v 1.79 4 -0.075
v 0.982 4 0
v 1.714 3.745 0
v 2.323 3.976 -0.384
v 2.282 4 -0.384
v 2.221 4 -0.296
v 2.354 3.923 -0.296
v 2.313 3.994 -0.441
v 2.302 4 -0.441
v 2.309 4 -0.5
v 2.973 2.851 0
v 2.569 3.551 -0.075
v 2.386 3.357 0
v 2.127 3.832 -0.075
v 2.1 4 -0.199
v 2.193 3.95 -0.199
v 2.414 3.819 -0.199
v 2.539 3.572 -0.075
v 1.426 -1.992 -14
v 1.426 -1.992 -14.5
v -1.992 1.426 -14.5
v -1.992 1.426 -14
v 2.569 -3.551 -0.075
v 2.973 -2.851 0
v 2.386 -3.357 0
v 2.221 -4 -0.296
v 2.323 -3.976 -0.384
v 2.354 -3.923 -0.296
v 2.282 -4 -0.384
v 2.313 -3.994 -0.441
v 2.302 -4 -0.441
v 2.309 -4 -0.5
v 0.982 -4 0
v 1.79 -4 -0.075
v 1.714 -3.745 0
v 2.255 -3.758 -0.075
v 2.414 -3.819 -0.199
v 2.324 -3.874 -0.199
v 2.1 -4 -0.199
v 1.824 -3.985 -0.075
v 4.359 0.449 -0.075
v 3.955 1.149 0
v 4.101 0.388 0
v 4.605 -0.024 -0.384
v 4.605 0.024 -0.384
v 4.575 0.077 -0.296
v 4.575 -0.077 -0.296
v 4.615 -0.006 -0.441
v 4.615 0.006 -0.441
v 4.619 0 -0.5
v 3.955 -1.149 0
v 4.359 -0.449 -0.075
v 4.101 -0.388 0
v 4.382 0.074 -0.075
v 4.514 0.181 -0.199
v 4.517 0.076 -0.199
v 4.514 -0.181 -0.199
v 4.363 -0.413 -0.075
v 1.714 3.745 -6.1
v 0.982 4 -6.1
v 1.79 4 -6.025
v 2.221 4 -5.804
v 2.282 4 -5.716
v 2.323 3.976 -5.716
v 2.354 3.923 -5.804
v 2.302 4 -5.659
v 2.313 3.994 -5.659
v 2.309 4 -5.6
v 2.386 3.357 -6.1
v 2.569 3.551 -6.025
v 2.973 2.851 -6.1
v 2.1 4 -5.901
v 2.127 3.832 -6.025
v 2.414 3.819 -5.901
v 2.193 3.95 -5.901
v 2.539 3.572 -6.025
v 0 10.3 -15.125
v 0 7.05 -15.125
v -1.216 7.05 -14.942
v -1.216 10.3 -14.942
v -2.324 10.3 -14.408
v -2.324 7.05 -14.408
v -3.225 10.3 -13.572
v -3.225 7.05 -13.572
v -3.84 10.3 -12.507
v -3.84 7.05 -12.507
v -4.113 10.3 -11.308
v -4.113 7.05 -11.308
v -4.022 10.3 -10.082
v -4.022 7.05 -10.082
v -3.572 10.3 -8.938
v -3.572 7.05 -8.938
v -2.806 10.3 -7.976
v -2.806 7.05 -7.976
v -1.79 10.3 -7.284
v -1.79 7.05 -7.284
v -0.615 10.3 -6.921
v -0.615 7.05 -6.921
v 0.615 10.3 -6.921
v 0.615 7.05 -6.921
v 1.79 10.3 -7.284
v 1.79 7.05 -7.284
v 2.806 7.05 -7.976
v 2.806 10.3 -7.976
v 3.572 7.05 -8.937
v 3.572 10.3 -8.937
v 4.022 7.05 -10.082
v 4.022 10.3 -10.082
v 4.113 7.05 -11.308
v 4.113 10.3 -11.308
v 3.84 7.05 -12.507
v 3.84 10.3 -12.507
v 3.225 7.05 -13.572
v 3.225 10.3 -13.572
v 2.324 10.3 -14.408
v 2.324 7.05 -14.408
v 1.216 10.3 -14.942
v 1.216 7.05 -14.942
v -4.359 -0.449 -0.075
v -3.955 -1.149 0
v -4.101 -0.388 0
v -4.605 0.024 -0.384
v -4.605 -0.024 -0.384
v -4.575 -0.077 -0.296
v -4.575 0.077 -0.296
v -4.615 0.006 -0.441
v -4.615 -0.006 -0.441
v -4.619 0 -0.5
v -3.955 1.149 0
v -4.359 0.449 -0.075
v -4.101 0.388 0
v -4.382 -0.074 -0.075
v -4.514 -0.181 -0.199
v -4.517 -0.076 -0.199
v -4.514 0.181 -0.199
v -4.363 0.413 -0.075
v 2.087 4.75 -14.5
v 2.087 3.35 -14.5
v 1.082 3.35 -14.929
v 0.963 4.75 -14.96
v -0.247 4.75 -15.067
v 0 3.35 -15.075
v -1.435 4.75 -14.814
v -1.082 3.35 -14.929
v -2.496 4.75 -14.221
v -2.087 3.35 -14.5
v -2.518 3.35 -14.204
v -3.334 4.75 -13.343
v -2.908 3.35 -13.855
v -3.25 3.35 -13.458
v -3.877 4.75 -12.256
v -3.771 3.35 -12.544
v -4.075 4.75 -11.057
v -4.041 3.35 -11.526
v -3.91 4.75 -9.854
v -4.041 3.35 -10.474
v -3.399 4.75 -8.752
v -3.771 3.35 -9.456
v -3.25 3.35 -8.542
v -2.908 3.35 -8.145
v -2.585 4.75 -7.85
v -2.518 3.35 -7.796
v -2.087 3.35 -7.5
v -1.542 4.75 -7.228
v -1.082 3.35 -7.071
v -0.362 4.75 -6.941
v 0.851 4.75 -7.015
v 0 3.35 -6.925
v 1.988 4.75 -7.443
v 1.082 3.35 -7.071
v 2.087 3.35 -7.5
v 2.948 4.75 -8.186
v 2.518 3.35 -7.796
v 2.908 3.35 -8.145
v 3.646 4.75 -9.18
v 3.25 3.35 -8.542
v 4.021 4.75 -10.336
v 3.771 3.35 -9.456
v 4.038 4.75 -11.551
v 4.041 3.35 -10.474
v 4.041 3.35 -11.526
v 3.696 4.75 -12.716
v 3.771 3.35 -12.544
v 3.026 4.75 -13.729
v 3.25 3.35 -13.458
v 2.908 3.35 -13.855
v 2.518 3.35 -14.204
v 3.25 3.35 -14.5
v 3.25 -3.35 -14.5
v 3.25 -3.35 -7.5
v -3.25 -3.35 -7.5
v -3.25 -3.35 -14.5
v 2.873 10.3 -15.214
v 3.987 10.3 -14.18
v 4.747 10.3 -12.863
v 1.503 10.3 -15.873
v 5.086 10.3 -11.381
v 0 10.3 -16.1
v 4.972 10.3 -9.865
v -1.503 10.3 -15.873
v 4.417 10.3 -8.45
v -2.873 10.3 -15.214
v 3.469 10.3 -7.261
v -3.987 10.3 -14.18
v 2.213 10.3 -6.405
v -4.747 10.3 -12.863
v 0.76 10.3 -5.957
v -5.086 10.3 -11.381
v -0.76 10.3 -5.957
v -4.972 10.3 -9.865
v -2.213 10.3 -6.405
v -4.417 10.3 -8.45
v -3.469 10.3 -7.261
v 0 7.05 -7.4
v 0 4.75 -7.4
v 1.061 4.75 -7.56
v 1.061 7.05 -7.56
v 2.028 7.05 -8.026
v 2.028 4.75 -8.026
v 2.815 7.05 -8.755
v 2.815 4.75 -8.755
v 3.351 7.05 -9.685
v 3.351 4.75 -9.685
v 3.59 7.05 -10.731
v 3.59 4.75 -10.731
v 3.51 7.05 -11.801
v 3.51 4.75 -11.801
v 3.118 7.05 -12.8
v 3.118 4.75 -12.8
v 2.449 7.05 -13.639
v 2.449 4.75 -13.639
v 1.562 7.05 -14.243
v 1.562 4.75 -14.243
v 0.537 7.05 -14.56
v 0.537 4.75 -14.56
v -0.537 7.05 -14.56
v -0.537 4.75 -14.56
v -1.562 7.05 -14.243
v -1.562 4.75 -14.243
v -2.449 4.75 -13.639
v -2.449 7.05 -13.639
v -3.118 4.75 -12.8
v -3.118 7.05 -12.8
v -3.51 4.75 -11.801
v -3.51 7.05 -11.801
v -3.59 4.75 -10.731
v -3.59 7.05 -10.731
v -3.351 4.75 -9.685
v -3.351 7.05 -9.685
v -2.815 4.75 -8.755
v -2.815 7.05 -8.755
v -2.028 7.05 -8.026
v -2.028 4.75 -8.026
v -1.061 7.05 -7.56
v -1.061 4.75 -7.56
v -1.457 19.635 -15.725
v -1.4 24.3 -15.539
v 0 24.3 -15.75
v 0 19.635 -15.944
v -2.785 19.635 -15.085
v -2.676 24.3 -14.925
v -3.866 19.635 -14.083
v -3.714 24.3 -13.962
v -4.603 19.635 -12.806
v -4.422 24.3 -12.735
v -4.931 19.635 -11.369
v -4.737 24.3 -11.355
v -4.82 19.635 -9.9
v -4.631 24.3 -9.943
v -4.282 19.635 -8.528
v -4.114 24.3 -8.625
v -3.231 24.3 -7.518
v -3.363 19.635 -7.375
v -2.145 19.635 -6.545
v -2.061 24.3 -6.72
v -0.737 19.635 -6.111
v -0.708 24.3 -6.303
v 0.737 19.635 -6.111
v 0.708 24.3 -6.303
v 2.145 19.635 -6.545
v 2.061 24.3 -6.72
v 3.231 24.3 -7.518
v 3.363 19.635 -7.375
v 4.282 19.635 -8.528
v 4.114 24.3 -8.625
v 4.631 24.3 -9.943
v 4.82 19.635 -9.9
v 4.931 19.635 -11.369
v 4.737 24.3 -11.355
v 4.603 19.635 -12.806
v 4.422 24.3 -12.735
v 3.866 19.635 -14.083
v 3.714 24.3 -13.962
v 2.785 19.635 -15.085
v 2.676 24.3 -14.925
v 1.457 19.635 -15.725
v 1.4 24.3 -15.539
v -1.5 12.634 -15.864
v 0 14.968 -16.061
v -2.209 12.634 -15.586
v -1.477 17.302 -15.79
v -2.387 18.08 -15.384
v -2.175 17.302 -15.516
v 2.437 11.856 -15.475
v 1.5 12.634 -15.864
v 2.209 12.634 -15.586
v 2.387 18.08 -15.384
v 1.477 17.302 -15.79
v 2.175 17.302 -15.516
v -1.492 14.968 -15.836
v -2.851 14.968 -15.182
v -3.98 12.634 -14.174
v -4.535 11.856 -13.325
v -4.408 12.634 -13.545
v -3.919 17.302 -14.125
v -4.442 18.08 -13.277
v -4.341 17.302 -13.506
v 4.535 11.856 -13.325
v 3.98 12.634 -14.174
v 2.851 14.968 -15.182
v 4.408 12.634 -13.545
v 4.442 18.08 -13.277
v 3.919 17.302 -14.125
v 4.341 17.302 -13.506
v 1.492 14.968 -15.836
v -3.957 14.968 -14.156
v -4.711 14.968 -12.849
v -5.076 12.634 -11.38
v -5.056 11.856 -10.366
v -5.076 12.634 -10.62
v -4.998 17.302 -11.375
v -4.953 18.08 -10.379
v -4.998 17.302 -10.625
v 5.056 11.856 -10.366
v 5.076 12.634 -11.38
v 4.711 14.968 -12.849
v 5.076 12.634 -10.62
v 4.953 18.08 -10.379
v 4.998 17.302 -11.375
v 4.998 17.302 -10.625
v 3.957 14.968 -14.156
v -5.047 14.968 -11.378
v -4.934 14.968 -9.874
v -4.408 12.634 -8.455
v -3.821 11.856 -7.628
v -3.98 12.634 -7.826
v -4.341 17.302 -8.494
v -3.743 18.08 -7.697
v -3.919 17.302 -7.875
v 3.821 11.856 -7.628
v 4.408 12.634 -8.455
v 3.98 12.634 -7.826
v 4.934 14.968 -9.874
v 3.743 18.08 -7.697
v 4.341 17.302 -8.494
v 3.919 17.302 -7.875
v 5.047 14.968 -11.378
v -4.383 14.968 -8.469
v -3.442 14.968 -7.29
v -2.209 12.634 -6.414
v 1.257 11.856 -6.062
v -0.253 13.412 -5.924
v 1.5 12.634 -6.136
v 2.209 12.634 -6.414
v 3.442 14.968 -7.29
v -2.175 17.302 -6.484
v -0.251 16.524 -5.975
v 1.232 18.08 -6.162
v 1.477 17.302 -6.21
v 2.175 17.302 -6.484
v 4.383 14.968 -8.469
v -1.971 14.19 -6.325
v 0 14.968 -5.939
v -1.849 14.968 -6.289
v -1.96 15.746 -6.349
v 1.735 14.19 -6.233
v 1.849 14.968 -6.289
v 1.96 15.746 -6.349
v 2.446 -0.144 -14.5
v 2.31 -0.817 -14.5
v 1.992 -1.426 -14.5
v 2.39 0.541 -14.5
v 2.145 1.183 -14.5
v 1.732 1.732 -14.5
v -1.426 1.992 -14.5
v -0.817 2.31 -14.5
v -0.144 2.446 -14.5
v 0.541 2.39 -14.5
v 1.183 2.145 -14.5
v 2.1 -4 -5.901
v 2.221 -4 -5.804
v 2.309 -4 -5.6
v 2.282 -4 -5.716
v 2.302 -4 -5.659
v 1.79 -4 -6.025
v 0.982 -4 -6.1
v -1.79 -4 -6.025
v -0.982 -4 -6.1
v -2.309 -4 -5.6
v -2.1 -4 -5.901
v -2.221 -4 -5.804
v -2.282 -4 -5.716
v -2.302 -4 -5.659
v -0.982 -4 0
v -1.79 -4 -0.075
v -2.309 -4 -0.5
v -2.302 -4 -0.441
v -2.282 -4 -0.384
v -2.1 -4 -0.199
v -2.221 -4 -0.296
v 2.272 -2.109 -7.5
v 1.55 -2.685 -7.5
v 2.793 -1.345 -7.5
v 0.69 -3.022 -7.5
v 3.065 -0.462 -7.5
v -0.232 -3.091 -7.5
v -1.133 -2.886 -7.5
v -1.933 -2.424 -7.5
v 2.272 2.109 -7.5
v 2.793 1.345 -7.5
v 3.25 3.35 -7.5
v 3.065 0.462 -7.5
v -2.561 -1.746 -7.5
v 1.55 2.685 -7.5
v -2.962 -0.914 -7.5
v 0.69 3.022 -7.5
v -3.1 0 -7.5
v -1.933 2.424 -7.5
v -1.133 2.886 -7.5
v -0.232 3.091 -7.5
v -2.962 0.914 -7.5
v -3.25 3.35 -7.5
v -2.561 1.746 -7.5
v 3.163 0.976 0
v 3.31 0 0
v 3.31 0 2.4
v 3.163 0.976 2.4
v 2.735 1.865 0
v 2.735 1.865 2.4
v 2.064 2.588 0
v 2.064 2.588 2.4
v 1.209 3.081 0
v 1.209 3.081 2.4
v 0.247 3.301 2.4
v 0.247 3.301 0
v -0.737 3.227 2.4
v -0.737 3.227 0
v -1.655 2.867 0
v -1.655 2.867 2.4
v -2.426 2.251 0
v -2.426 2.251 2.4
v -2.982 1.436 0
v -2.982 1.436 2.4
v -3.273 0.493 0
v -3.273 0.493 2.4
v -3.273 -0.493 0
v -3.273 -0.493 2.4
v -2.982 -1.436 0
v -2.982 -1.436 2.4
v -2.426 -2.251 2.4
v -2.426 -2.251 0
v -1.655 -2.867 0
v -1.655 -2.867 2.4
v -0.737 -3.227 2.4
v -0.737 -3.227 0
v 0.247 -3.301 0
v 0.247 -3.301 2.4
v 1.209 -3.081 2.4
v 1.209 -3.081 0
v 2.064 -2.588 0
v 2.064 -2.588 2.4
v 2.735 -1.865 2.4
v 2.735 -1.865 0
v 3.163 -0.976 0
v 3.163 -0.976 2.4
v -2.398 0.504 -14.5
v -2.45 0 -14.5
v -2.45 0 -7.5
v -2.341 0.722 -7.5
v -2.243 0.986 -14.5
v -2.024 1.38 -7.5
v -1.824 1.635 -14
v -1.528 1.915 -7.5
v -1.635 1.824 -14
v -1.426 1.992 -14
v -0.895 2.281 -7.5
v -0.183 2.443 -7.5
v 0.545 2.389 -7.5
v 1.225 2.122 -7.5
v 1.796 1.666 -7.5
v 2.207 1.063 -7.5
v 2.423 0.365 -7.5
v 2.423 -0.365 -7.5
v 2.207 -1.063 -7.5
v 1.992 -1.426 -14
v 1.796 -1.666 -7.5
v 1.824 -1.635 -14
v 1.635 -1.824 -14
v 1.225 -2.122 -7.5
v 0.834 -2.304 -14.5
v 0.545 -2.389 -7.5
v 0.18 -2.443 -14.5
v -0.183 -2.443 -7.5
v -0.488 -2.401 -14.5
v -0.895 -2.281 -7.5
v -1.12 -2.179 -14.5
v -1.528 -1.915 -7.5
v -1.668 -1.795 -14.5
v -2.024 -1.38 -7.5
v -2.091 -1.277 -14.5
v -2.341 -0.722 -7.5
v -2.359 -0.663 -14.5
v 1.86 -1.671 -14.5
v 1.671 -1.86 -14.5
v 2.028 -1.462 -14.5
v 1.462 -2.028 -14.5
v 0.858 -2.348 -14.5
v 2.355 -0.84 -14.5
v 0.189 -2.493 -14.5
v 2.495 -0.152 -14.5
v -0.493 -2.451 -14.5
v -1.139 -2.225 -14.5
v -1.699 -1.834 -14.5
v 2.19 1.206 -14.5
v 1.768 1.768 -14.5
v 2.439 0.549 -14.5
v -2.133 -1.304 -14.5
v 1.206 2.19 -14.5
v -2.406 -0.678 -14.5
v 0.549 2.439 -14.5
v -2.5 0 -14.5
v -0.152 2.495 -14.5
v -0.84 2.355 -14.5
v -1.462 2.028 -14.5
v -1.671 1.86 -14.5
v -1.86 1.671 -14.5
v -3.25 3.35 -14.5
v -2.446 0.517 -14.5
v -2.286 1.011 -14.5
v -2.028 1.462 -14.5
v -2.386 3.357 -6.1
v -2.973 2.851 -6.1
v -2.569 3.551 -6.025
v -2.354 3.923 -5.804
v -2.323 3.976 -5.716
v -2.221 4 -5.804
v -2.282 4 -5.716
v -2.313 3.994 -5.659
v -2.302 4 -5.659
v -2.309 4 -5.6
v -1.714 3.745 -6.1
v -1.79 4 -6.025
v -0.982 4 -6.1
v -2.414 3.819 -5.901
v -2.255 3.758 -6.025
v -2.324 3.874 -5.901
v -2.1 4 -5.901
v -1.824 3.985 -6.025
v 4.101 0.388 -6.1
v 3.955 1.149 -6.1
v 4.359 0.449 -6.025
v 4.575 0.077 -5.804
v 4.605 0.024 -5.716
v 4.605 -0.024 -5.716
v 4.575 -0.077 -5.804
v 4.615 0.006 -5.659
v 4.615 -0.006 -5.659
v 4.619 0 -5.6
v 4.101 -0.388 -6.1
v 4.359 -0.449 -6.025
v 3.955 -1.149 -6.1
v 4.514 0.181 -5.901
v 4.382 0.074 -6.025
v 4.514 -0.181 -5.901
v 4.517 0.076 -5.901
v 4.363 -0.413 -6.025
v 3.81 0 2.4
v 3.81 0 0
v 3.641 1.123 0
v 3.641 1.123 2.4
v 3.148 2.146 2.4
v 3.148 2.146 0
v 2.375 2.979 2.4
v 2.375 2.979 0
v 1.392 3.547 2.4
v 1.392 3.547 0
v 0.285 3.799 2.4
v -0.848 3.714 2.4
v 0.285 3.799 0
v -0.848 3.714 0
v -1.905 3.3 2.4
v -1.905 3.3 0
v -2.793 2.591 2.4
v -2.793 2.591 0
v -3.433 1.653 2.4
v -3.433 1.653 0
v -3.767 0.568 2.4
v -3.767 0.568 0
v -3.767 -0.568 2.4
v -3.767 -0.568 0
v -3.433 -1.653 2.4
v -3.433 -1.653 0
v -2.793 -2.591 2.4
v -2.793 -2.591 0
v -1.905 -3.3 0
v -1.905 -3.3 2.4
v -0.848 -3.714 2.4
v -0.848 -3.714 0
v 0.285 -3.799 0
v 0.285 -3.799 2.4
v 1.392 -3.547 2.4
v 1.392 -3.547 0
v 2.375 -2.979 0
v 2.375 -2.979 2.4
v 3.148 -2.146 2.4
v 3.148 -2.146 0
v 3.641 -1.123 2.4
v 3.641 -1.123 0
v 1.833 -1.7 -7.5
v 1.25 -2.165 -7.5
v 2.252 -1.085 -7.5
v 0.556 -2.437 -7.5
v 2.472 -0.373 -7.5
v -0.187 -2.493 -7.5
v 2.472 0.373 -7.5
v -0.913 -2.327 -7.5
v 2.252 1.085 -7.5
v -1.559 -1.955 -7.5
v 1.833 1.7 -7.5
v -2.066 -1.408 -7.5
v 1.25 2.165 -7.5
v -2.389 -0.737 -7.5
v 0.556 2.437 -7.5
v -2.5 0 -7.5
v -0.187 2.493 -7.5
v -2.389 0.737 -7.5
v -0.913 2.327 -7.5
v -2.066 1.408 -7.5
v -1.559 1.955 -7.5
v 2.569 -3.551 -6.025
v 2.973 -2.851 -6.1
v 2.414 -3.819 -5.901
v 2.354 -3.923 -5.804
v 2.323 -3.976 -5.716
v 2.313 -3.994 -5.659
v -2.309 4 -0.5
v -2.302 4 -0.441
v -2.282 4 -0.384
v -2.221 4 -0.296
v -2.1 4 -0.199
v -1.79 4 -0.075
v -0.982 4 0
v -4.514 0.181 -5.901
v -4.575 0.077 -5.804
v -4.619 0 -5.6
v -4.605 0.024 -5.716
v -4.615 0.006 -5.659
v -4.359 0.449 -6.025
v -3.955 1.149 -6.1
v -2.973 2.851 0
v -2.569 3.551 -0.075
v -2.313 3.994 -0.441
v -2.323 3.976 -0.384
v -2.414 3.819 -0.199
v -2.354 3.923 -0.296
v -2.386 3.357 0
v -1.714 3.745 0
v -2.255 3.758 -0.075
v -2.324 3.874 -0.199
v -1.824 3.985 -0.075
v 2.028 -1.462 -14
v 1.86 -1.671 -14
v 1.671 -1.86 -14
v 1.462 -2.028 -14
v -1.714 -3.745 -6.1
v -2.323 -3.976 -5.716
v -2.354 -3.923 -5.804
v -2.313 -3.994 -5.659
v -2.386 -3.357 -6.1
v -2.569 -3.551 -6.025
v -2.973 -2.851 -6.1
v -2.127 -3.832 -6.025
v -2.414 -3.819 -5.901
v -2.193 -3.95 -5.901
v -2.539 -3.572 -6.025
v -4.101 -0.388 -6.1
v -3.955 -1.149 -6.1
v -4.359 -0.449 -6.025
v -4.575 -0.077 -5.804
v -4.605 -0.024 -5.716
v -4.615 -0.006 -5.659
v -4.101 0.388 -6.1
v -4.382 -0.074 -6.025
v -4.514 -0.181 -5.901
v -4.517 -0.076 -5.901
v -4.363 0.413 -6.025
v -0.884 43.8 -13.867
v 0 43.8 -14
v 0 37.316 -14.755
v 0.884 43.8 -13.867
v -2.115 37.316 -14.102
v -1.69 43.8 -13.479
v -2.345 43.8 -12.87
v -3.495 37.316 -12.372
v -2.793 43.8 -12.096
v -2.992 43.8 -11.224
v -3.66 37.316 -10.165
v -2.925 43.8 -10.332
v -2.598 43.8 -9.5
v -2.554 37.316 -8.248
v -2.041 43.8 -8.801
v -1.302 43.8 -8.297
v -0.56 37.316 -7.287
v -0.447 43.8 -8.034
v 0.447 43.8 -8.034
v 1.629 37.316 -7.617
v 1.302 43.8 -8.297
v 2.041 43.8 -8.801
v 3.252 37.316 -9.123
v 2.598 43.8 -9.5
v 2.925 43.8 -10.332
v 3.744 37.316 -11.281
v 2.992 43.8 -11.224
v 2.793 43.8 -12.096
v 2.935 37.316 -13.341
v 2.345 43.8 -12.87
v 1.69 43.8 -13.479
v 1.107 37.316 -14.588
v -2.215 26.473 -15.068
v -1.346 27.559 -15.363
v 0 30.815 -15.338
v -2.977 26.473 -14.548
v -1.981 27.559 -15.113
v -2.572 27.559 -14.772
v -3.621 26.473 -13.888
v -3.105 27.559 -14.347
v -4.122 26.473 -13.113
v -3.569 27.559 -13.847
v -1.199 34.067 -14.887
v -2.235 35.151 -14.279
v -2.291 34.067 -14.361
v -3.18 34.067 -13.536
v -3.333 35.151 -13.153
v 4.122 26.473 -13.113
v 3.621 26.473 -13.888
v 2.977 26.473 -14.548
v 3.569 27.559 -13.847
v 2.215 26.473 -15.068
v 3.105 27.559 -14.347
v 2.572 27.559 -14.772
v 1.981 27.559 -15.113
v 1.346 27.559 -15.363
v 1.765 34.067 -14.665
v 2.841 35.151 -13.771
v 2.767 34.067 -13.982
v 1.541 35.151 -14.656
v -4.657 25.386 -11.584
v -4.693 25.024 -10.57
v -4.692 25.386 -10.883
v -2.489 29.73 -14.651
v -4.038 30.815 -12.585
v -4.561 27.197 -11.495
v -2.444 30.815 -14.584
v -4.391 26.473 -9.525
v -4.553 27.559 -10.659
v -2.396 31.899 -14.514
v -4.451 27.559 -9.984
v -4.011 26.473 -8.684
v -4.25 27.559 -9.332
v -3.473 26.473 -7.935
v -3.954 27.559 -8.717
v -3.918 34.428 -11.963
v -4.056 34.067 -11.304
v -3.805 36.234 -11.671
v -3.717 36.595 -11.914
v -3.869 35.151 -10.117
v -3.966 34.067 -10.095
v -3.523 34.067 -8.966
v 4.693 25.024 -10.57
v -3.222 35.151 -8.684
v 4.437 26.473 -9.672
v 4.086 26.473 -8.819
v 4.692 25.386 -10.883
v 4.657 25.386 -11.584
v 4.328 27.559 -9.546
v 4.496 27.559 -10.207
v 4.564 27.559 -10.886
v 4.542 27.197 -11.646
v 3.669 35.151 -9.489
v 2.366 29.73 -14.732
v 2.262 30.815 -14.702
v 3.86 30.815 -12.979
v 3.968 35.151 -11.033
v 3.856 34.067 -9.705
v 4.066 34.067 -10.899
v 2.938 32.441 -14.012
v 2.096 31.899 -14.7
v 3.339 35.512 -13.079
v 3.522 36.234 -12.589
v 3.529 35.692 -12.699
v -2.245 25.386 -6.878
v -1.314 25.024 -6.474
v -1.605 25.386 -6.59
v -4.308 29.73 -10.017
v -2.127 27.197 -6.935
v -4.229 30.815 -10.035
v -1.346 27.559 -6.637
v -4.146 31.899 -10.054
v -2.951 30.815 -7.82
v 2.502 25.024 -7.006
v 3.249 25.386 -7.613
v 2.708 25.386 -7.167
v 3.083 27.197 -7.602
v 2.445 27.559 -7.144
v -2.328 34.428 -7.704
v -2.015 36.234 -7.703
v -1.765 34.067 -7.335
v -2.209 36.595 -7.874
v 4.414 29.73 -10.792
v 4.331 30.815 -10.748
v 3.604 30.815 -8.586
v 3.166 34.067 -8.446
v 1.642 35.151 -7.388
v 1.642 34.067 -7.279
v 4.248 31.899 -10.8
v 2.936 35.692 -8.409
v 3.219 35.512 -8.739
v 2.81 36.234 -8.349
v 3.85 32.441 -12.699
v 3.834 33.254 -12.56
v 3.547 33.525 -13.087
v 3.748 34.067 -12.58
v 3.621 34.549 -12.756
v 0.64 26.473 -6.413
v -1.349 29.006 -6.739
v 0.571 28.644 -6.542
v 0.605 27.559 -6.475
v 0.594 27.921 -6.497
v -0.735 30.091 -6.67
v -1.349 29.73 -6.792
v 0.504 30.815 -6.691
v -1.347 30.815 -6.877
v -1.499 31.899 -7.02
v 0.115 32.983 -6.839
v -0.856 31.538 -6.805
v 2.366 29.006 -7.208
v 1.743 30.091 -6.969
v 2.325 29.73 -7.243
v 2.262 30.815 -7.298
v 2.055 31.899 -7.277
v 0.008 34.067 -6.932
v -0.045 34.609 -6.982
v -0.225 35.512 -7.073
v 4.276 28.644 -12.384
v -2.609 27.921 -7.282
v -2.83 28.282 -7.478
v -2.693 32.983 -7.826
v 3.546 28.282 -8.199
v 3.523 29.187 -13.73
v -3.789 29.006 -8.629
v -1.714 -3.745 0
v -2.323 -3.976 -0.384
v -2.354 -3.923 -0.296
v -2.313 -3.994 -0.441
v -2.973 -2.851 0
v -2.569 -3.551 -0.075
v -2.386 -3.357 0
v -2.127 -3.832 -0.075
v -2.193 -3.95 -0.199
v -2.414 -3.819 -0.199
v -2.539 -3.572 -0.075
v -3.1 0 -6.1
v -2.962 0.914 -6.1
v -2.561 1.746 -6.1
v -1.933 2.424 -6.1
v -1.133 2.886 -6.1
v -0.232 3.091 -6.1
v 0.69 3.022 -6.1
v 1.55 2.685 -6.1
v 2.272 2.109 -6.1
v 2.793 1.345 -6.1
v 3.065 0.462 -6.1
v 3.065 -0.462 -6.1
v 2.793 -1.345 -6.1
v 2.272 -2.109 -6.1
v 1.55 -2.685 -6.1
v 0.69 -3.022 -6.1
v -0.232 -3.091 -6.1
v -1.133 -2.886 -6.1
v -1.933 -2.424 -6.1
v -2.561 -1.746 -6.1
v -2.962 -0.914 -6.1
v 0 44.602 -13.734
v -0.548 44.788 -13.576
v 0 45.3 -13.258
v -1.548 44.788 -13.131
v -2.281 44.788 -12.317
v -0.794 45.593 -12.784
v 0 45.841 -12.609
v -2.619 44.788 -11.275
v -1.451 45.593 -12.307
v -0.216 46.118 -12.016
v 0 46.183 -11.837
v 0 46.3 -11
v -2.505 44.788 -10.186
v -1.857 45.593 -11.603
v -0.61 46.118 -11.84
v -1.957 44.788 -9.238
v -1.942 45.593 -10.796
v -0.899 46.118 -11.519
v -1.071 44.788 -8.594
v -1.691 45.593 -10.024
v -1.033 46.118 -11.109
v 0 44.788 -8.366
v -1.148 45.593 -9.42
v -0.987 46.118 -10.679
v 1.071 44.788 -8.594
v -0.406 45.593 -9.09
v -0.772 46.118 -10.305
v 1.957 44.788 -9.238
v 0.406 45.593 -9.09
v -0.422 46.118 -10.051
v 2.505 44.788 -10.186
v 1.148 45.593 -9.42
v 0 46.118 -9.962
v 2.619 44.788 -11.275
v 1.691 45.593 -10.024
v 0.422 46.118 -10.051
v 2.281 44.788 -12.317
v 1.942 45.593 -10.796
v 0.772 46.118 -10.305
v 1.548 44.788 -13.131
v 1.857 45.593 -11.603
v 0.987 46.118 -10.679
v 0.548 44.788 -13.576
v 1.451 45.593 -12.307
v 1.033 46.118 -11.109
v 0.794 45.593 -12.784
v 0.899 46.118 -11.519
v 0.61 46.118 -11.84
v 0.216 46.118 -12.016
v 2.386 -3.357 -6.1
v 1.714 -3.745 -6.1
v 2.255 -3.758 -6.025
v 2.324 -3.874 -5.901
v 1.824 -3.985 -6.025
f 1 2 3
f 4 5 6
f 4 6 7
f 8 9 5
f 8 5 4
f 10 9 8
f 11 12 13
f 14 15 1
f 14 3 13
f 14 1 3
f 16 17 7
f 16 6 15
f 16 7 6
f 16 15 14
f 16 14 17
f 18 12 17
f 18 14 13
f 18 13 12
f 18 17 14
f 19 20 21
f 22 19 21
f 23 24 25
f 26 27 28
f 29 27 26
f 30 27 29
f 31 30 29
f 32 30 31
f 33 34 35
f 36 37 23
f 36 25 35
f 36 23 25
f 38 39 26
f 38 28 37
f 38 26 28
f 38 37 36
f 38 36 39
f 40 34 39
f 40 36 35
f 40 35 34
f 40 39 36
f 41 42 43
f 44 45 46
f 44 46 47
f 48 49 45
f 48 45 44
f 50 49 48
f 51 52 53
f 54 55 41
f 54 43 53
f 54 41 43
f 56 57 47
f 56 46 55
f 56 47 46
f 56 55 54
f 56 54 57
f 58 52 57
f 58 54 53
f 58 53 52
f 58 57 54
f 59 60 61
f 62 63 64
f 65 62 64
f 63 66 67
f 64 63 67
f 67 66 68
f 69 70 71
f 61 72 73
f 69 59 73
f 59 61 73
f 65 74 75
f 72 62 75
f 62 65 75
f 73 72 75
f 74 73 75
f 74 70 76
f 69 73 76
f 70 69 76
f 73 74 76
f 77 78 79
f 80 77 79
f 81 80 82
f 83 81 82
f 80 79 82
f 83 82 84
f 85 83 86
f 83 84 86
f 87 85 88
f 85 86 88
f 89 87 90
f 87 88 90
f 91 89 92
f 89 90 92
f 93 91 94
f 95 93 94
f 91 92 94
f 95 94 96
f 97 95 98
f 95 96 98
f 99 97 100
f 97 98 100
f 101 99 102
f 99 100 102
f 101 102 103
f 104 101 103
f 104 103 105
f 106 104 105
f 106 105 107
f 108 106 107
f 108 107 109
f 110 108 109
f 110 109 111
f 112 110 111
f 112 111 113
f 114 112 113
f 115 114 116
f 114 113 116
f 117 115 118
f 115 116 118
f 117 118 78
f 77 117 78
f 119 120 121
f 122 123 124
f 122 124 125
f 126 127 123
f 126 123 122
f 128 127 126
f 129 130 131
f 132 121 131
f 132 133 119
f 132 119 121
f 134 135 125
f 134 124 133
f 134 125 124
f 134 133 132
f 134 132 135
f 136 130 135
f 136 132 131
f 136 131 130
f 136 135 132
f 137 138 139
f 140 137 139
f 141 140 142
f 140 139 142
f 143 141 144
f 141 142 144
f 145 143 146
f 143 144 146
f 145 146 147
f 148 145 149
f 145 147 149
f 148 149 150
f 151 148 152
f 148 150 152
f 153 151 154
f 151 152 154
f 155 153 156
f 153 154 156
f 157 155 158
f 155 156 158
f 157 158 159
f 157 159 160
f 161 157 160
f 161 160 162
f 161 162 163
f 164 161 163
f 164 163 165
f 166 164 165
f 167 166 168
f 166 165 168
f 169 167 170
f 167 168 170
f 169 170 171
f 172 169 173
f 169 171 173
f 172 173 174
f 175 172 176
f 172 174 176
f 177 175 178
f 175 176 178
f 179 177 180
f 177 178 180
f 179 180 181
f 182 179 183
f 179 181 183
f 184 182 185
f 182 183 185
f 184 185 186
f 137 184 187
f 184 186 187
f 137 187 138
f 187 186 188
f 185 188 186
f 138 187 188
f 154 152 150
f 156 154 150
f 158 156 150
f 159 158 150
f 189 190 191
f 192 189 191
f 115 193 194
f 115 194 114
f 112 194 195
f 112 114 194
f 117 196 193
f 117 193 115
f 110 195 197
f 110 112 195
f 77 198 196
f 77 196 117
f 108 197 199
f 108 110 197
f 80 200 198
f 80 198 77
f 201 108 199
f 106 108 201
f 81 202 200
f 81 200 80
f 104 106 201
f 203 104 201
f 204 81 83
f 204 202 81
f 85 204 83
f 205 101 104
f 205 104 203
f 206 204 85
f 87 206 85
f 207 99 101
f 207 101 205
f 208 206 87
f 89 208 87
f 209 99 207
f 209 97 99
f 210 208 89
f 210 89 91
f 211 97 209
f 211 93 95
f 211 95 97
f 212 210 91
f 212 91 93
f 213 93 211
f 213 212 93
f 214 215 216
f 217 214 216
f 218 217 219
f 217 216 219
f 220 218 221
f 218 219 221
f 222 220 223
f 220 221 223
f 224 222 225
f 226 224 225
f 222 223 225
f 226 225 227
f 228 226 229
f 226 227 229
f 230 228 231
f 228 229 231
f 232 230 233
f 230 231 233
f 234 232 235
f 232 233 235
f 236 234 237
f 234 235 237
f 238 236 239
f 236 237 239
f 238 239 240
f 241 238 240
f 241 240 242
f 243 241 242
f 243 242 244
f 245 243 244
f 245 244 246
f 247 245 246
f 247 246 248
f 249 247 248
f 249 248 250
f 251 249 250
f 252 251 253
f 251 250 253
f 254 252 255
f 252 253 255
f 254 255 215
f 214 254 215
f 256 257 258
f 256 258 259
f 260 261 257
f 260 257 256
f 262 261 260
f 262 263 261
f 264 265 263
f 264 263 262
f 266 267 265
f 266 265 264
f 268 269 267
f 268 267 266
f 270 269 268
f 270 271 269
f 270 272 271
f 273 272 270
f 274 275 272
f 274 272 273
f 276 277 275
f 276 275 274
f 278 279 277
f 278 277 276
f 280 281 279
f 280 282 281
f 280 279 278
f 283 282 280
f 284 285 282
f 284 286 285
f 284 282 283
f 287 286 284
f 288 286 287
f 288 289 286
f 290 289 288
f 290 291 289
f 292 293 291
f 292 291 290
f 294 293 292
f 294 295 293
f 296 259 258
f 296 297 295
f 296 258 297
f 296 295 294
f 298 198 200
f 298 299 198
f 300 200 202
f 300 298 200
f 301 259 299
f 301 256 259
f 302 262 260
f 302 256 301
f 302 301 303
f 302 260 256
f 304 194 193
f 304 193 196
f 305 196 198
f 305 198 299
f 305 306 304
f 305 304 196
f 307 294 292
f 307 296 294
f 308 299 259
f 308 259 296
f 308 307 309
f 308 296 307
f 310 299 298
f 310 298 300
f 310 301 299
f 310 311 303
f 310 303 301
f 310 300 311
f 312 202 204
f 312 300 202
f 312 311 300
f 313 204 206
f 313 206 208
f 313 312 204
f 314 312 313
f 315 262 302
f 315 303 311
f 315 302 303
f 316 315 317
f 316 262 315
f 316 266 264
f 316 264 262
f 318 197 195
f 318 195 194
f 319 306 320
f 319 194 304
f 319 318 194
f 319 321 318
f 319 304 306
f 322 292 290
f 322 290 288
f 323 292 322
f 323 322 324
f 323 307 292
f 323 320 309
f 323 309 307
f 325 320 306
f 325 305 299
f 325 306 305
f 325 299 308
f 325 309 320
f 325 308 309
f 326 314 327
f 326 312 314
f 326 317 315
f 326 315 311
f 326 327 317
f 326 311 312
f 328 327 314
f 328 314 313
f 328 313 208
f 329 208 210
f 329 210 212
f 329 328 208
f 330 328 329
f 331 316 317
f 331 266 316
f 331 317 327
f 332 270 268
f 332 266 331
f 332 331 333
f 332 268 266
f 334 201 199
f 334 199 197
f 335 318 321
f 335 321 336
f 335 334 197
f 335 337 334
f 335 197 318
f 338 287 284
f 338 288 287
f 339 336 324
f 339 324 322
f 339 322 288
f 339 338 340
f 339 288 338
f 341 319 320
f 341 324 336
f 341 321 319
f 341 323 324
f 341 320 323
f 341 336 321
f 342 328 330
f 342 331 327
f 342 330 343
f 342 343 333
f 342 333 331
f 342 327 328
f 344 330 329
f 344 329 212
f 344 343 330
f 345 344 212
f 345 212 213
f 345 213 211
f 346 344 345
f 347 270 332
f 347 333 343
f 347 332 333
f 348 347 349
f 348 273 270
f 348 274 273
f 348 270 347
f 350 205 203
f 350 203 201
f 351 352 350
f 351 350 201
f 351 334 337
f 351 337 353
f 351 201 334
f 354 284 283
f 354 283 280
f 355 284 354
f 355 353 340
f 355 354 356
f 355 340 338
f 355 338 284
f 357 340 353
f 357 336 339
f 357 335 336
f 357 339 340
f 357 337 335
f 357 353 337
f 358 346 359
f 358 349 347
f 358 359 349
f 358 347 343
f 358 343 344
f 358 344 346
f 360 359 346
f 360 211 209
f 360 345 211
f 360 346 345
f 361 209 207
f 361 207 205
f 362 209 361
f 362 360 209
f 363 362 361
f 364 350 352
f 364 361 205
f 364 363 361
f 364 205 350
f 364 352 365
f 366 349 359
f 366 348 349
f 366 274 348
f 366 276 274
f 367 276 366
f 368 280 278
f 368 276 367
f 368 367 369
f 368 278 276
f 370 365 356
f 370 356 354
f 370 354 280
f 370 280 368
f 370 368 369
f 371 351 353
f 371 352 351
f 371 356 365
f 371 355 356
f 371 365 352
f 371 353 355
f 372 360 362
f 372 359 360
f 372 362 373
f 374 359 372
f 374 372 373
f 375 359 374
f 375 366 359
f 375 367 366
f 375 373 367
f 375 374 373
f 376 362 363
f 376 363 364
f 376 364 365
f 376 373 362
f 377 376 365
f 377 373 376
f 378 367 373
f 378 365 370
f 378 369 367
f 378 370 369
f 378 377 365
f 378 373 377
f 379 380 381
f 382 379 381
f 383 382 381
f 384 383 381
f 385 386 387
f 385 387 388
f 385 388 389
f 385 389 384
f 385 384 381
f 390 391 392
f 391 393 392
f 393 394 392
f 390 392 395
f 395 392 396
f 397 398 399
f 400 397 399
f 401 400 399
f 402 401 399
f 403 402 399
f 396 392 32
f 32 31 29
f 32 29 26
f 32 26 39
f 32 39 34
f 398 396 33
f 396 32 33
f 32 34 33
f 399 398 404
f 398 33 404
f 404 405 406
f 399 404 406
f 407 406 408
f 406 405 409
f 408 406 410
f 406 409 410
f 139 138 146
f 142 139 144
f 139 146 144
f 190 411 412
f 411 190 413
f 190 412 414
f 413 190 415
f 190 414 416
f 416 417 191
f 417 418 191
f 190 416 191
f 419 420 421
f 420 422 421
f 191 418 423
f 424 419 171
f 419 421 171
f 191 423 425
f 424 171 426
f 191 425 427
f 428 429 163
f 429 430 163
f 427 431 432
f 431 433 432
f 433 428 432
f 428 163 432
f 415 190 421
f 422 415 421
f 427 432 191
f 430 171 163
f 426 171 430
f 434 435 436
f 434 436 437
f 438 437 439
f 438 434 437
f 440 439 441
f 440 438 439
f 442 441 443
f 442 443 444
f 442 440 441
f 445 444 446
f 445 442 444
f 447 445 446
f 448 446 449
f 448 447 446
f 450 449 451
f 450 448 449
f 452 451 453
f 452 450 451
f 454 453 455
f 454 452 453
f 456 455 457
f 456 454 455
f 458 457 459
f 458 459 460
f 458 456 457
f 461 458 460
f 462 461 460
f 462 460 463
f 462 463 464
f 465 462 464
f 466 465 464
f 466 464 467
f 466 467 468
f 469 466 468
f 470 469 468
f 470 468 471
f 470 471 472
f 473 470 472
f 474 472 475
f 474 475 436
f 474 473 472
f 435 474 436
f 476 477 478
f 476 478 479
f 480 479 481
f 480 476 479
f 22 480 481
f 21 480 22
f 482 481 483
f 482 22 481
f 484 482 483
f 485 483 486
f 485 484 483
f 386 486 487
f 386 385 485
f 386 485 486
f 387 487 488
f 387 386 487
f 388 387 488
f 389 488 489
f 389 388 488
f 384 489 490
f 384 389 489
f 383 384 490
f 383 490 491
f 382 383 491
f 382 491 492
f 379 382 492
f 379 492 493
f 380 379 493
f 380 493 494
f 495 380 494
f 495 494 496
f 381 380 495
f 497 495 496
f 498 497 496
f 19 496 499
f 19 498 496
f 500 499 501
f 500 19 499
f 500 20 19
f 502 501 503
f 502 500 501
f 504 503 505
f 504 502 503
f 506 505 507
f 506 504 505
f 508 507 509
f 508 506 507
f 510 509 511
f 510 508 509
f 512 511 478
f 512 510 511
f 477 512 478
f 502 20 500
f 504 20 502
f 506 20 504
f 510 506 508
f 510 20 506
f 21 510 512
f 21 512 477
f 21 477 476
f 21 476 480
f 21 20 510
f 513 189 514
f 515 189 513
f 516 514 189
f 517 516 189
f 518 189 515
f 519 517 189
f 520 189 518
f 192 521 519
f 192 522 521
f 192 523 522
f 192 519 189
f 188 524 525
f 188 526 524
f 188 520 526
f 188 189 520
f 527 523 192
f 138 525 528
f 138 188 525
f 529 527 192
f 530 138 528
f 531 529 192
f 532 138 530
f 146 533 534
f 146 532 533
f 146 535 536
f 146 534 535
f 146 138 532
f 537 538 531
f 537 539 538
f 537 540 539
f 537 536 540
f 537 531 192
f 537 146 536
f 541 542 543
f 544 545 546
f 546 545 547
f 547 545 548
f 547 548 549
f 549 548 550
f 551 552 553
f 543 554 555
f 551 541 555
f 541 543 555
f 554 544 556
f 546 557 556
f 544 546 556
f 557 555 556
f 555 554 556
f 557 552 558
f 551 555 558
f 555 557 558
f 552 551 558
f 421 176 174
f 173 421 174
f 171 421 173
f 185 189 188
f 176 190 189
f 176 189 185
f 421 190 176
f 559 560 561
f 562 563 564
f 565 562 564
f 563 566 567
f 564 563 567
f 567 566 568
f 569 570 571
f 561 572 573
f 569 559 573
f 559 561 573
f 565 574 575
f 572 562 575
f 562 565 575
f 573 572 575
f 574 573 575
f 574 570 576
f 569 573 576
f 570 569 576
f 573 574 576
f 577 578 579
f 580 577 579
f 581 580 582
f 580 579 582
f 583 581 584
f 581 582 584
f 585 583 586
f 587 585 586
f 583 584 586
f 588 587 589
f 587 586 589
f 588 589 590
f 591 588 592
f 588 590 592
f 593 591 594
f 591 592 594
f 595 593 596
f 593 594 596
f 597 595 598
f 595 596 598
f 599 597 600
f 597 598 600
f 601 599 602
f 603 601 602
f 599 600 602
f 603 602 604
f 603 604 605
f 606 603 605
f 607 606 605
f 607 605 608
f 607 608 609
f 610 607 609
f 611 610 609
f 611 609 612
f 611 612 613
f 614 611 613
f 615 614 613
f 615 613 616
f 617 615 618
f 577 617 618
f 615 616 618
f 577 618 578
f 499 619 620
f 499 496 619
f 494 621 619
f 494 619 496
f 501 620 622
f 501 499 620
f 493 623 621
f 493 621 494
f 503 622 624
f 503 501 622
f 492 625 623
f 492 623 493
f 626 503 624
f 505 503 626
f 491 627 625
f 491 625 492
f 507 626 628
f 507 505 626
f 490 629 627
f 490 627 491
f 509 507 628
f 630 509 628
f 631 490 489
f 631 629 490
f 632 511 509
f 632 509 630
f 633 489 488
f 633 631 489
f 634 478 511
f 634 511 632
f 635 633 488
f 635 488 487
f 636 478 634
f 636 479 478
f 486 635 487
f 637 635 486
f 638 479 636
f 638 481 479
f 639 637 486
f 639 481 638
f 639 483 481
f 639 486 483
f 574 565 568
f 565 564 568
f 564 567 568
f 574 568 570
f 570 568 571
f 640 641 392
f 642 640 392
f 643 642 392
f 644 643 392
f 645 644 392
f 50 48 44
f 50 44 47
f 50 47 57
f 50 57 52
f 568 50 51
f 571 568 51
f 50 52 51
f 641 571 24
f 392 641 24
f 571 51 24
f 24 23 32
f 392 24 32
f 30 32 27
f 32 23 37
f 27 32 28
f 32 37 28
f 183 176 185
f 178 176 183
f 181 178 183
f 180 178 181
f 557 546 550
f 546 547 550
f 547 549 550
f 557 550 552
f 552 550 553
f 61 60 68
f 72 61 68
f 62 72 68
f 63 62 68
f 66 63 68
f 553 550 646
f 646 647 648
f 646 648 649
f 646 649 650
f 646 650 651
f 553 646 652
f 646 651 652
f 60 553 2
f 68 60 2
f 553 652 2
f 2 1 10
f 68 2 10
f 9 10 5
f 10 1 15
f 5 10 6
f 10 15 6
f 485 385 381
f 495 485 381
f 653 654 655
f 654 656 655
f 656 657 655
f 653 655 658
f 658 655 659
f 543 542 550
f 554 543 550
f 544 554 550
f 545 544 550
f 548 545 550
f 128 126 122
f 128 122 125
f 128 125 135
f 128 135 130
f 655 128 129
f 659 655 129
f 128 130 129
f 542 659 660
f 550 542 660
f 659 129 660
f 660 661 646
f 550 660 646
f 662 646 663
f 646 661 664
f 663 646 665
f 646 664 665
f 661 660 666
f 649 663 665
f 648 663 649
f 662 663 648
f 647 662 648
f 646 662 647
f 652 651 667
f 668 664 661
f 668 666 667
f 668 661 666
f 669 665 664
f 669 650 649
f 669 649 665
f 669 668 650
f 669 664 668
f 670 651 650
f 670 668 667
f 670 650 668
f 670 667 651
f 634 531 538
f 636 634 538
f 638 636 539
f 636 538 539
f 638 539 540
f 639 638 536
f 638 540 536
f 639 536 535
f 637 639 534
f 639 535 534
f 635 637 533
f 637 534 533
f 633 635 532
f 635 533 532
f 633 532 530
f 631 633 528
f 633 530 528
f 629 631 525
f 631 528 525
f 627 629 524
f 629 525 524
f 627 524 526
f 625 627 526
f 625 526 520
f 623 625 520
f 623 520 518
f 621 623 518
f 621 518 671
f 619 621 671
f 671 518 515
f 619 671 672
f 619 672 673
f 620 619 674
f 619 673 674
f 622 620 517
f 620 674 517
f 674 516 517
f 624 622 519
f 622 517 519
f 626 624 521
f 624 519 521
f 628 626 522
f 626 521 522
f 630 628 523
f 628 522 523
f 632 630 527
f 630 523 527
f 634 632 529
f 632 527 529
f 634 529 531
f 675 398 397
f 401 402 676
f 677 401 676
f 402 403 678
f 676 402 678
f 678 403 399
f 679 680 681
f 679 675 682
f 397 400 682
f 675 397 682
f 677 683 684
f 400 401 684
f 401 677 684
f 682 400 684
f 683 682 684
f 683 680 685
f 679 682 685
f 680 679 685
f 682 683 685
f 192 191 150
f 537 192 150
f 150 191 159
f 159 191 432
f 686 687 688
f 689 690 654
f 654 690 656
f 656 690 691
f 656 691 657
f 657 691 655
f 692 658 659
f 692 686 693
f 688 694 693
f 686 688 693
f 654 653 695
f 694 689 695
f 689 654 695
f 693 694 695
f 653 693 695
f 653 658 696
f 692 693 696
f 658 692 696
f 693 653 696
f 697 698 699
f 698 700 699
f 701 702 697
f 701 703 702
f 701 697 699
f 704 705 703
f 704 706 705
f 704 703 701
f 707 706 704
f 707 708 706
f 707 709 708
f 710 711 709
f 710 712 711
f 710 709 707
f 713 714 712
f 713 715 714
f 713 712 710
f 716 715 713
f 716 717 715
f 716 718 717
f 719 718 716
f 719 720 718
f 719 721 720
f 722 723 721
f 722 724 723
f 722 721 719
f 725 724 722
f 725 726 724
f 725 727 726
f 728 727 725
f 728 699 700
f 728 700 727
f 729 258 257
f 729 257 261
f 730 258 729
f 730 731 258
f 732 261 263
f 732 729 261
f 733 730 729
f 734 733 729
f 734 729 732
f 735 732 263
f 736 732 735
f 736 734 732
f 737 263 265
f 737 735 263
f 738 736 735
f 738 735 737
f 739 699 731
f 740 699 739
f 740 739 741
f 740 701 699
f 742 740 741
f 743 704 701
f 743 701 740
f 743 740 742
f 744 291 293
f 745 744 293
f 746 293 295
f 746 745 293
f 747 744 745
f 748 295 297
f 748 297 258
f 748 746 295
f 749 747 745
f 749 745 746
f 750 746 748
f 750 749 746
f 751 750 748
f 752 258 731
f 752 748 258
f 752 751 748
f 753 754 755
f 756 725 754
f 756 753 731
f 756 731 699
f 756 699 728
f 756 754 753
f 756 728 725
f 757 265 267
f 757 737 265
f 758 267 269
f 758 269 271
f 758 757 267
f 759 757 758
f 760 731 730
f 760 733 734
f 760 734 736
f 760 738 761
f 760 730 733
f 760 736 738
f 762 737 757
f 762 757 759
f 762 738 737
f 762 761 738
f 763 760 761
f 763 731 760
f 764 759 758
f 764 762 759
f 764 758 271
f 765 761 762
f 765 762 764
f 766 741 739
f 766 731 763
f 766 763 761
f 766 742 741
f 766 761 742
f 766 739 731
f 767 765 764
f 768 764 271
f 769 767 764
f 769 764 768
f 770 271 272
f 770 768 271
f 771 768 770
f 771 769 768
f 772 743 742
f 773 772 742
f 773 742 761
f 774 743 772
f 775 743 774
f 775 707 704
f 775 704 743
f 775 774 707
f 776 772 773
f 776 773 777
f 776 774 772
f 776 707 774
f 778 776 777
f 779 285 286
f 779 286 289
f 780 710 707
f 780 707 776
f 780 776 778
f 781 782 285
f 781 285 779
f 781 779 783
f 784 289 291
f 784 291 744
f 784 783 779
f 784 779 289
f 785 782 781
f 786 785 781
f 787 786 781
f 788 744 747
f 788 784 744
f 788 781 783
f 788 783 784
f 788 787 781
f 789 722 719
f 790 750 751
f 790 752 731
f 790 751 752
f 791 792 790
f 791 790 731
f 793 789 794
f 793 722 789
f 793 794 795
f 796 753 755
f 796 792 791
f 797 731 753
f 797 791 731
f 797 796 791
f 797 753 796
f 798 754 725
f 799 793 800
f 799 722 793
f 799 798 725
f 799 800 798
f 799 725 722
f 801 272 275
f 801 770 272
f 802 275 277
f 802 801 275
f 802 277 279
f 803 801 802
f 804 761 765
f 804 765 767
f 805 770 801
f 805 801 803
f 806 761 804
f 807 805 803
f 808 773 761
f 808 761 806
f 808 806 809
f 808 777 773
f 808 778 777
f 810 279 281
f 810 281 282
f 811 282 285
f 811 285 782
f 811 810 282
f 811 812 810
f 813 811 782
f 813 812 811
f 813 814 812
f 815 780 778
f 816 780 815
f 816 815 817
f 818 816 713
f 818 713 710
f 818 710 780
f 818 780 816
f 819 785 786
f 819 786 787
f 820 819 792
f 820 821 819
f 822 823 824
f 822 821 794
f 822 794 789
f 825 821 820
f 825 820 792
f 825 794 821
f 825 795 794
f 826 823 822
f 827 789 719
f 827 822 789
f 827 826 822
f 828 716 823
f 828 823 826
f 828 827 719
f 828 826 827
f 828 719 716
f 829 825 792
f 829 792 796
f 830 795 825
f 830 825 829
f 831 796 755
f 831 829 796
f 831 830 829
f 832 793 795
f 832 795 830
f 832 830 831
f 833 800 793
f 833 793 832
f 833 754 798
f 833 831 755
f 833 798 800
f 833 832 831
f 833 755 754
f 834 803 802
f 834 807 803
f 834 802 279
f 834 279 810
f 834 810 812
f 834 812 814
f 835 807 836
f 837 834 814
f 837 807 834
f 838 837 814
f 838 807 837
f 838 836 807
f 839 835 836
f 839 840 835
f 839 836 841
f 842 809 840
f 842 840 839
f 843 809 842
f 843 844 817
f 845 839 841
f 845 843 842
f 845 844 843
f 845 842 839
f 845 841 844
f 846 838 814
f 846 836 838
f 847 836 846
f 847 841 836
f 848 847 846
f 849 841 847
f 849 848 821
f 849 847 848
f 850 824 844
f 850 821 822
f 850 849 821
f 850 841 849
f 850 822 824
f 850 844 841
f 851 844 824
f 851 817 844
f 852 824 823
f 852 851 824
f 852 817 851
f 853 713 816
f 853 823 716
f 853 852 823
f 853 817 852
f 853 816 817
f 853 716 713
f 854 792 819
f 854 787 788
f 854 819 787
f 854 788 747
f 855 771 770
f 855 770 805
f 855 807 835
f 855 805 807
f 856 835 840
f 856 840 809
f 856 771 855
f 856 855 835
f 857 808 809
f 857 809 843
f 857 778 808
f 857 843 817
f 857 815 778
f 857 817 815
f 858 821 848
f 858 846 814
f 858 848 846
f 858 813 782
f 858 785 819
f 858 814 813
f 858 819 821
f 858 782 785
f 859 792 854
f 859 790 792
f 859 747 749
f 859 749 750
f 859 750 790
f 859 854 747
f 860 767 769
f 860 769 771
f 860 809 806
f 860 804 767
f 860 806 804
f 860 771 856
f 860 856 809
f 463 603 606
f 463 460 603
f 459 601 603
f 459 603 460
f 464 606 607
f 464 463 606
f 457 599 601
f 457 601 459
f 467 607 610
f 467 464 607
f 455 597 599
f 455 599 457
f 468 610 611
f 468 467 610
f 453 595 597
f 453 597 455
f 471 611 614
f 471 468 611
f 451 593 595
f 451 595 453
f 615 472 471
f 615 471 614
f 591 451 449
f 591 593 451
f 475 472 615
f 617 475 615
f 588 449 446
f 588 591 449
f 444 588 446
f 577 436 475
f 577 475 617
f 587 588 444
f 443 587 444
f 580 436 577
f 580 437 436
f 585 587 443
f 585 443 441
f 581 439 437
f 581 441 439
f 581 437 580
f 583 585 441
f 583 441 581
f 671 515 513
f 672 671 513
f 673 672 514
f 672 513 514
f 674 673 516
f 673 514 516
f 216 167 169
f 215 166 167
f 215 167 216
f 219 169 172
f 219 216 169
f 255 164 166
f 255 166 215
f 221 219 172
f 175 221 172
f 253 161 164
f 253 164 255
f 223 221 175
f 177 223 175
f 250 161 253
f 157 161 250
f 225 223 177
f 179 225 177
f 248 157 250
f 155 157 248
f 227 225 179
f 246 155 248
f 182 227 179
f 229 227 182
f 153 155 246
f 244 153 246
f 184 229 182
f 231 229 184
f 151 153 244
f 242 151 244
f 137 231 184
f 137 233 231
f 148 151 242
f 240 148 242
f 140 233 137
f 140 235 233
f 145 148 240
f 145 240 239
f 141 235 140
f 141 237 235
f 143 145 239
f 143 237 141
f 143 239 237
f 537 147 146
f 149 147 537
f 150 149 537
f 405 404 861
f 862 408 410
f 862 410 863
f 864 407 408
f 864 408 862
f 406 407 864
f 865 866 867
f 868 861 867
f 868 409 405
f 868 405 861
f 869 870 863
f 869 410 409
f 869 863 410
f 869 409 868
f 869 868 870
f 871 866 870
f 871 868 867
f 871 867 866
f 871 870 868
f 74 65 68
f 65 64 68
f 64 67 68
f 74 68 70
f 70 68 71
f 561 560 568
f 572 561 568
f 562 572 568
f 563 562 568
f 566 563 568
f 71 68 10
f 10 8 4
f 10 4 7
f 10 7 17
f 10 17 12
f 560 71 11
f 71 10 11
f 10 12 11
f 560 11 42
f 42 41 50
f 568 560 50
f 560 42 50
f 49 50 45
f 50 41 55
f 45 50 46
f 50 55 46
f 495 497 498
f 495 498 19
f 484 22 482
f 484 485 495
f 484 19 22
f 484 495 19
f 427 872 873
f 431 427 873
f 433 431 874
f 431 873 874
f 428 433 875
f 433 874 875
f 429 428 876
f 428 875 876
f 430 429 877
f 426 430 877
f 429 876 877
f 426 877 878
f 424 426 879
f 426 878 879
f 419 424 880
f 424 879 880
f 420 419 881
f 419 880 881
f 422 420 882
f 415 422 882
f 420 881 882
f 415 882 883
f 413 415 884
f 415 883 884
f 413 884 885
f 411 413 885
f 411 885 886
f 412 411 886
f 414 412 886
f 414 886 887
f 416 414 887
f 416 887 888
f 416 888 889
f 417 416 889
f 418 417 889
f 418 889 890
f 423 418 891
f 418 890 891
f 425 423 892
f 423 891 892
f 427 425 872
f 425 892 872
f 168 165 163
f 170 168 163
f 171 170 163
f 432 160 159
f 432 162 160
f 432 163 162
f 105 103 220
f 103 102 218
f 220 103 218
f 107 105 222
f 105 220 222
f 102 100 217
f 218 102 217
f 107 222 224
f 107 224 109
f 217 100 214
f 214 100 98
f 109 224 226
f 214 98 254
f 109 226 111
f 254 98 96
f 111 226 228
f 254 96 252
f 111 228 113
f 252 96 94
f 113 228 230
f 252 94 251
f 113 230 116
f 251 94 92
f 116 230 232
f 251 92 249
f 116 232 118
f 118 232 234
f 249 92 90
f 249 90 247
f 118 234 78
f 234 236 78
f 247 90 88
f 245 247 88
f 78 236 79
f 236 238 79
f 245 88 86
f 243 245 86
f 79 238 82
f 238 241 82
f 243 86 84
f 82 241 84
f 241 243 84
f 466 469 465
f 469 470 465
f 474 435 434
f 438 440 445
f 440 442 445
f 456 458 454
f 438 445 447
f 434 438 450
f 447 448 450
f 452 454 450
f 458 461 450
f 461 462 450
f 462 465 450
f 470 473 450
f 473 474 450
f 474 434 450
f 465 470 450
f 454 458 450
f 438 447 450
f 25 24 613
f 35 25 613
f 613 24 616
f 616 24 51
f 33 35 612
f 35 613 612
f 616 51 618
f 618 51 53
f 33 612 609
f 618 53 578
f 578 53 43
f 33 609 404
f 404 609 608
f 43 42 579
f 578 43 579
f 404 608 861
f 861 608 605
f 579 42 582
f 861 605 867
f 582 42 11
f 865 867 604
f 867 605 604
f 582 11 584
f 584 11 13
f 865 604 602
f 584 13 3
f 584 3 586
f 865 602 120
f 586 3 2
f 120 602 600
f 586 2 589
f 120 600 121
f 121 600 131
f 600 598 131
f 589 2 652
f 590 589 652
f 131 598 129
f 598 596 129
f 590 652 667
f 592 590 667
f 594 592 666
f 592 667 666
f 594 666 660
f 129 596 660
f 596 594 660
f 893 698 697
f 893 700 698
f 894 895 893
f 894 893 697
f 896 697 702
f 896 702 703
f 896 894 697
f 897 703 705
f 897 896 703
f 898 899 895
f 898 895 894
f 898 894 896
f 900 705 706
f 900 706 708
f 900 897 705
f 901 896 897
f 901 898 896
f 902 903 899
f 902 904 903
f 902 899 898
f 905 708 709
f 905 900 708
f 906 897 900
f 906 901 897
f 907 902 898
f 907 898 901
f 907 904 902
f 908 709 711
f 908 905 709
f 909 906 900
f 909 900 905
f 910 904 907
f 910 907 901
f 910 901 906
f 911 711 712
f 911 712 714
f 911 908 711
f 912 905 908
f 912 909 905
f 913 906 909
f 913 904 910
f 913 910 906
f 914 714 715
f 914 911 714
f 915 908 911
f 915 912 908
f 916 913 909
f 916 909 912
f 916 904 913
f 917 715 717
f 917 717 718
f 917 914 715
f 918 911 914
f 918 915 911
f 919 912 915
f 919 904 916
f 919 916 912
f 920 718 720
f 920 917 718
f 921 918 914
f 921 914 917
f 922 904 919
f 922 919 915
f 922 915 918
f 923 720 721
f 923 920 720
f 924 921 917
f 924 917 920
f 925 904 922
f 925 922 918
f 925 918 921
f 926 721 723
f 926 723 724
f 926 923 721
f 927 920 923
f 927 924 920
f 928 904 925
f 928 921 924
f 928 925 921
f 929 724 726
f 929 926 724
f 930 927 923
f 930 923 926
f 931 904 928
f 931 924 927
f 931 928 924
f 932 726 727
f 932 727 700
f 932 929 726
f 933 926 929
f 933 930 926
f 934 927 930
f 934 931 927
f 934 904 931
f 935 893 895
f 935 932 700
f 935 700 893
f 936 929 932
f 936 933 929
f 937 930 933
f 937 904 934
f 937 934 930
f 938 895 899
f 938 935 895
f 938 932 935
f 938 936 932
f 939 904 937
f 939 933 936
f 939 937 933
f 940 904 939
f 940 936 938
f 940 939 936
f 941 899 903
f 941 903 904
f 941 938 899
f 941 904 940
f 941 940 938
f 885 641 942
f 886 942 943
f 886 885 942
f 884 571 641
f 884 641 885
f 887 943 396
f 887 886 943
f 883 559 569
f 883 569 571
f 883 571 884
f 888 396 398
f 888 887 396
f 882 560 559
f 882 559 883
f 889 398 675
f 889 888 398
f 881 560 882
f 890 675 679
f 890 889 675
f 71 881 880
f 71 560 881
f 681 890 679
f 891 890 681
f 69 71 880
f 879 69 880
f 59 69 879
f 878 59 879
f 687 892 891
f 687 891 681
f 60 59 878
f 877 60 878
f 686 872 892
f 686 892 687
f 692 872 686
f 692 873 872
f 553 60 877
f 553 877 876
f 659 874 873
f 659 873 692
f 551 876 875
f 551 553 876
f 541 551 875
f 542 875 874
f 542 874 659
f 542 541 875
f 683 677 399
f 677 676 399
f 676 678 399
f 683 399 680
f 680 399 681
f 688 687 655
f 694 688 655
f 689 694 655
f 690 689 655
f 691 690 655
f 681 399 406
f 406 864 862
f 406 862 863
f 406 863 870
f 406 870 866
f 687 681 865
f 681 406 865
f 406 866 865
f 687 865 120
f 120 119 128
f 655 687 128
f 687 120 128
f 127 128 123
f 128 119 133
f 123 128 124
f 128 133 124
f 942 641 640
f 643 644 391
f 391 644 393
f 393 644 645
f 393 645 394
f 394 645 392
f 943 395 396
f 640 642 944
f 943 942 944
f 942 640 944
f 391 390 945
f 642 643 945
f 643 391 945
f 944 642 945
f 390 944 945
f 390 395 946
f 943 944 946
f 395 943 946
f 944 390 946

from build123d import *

# Parameters (mm, degrees)
SKETCH1_R           = 3.81
SKETCH1_R_2         = 3.31
BOSS_EXTRUDE1_DEPTH = 2.4
BOSS_EXTRUDE2_DEPTH = 6.1
SKETCH4_R           = 3.1
BOSS_EXTRUDE3_DEPTH = 1.4
SKETCH5_W           = 6.5
SKETCH5_H           = 6.7
BOSS_EXTRUDE4_DEPTH = 7
SKETCH6_R           = 2.5
SKETCH6_R_2         = 2.45
CUT_EXTRUDE1_DEPTH  = 7
CUT_EXTRUDE2_DEPTH  = 0.5
SKETCH8_R           = 4.075
BOSS_EXTRUDE5_DEPTH = 1.4
SKETCH9_R           = 3.6
BOSS_EXTRUDE6_DEPTH = 2.3
SKETCH10_R          = 4.125
BOSS_EXTRUDE7_DEPTH = 3.25


with BuildPart() as part:
    # Sketch1 → Boss-Extrude1 (new body)
    with BuildSketch(Plane.XY):
        Circle(SKETCH1_R)
        Circle(SKETCH1_R_2, mode=Mode.SUBTRACT)
    extrude(amount=BOSS_EXTRUDE1_DEPTH)

    # Sketch2 → Boss-Extrude2 (add)
    with BuildSketch(Plane(origin=(0, 0, 0), x_dir=(-1, 0, 0), z_dir=(0, 0, -1))):
        Polygon((2.309401077, -4), (4.618802154, 0), (2.309401077, 4), (-2.309401077, 4), (-4.618802154, 0), (-2.309401077, -4), align=None)
    extrude(amount=BOSS_EXTRUDE2_DEPTH)

    # Sketch3 → Cut-Revolve1 (revolve, cut)
    with BuildSketch(Plane(origin=(0, 0, 0), x_dir=(1, 0, 0), z_dir=(0, 1, 0))):
        with BuildLine():
            Line((-4.618802154, 5.6), (-4.618802154, 6.1))
            Line((-4.618802154, 6.1), (-4.118802154, 6.1))
            ThreePointArc((-4.118802154, 6.1), (-4.472355544, 5.953553391), (-4.618802154, 5.6))
        make_face()
        with BuildLine():
            Line((-4.618802154, 0), (-4.118802154, 0))
            ThreePointArc((-4.118802154, 0), (-4.472355544, 0.146446609), (-4.618802154, 0.5))
            Line((-4.618802154, 0.5), (-4.618802154, 0))
        make_face()
    revolve(axis=Axis((0, 0, 0), (0, 0, -1)), mode=Mode.SUBTRACT)

    # Sketch4 → Boss-Extrude3 (add)
    with BuildSketch(Plane(origin=(0, 0, -6.1), x_dir=(-1, 0, 0), z_dir=(0, 0, -1))):
        Circle(SKETCH4_R)
    extrude(amount=BOSS_EXTRUDE3_DEPTH)

    # Sketch5 → Boss-Extrude4 (add)
    with BuildSketch(Plane(origin=(0, 0, -7.5), x_dir=(-1, 0, 0), z_dir=(0, 0, -1))):
        Rectangle(SKETCH5_W, SKETCH5_H)
    extrude(amount=BOSS_EXTRUDE4_DEPTH)

    # Sketch6 → Cut-Extrude1 (cut)
    with BuildSketch(Plane(origin=(0, 0, -14.5), x_dir=(-1, 0, 0), z_dir=(0, 0, -1))):
        Circle(SKETCH6_R)
        Circle(SKETCH6_R_2, mode=Mode.SUBTRACT)
    extrude(amount=-CUT_EXTRUDE1_DEPTH, mode=Mode.SUBTRACT)

    # Sketch7 → Cut-Extrude2 (cut)
    with BuildSketch(Plane(origin=(0, 0, -14.5), x_dir=(-1, 0, 0), z_dir=(0, 0, -1))):
        with BuildLine():
            Line((1.462150124, 2.027835549), (-2.027835549, -1.462150124))
            ThreePointArc((-2.027835549, -1.462150124), (-1.767766953, -1.767766953), (-1.462150124, -2.027835549))
            Line((-1.462150124, -2.027835549), (2.027835549, 1.462150124))
            ThreePointArc((2.027835549, 1.462150124), (1.767766953, 1.767766953), (1.462150124, 2.027835549))
        make_face()
    extrude(amount=-CUT_EXTRUDE2_DEPTH, mode=Mode.SUBTRACT)

    # Sketch8 → Boss-Extrude5 (add)
    with BuildSketch(Plane(origin=(0, 3.35, 0), x_dir=(1, 0, 0), z_dir=(0, 1, 0))):
        with Locations(Location((0, 11, 0), (0, 0, 59.192817964))):
            Circle(SKETCH8_R)
    extrude(amount=BOSS_EXTRUDE5_DEPTH)

    # Sketch9 → Boss-Extrude6 (add)
    with BuildSketch(Plane(origin=(0, 4.75, 0), x_dir=(1, 0, 0), z_dir=(0, 1, 0))):
        with Locations(Location((0, 11, 0), (0, 0, 270))):
            Circle(SKETCH9_R)
    extrude(amount=BOSS_EXTRUDE6_DEPTH)

    # Sketch10 → Boss-Extrude7 (add)
    with BuildSketch(Plane(origin=(0, 7.05, 0), x_dir=(1, 0, 0), z_dir=(0, 1, 0))):
        with Locations(Location((0, 11, 0), (0, 0, 90))):
            Circle(SKETCH10_R)
    extrude(amount=BOSS_EXTRUDE7_DEPTH)

    # Sketch11 → Revolve1 (revolve)
    with BuildSketch(Plane(origin=(0, 0, 0), x_dir=(0, 0, -1), z_dir=(1, 0, 0)), mode=Mode.PRIVATE) as revolve1_sk:
        with BuildLine():
            Line((11, 10.3), (5.9, 10.3))
            ThreePointArc((5.9, 10.3), (5.987513668, 17.302187158), (6.25, 24.3))
            ThreePointArc((6.25, 24.3), (6.932343055, 34.067289726), (8, 43.8))
            ThreePointArc((8, 43.8), (9.047437581, 45.593074903), (11, 46.3))
            Line((11, 46.3), (11, 10.3))
        make_face()
    revolve(revolve1_sk.sketch.rotate(Axis((0, 10.3, -11), (0, 1, 0)), 180), axis=Axis((0, 10.3, -11), (0, 1, 0)))


solid = part.part
